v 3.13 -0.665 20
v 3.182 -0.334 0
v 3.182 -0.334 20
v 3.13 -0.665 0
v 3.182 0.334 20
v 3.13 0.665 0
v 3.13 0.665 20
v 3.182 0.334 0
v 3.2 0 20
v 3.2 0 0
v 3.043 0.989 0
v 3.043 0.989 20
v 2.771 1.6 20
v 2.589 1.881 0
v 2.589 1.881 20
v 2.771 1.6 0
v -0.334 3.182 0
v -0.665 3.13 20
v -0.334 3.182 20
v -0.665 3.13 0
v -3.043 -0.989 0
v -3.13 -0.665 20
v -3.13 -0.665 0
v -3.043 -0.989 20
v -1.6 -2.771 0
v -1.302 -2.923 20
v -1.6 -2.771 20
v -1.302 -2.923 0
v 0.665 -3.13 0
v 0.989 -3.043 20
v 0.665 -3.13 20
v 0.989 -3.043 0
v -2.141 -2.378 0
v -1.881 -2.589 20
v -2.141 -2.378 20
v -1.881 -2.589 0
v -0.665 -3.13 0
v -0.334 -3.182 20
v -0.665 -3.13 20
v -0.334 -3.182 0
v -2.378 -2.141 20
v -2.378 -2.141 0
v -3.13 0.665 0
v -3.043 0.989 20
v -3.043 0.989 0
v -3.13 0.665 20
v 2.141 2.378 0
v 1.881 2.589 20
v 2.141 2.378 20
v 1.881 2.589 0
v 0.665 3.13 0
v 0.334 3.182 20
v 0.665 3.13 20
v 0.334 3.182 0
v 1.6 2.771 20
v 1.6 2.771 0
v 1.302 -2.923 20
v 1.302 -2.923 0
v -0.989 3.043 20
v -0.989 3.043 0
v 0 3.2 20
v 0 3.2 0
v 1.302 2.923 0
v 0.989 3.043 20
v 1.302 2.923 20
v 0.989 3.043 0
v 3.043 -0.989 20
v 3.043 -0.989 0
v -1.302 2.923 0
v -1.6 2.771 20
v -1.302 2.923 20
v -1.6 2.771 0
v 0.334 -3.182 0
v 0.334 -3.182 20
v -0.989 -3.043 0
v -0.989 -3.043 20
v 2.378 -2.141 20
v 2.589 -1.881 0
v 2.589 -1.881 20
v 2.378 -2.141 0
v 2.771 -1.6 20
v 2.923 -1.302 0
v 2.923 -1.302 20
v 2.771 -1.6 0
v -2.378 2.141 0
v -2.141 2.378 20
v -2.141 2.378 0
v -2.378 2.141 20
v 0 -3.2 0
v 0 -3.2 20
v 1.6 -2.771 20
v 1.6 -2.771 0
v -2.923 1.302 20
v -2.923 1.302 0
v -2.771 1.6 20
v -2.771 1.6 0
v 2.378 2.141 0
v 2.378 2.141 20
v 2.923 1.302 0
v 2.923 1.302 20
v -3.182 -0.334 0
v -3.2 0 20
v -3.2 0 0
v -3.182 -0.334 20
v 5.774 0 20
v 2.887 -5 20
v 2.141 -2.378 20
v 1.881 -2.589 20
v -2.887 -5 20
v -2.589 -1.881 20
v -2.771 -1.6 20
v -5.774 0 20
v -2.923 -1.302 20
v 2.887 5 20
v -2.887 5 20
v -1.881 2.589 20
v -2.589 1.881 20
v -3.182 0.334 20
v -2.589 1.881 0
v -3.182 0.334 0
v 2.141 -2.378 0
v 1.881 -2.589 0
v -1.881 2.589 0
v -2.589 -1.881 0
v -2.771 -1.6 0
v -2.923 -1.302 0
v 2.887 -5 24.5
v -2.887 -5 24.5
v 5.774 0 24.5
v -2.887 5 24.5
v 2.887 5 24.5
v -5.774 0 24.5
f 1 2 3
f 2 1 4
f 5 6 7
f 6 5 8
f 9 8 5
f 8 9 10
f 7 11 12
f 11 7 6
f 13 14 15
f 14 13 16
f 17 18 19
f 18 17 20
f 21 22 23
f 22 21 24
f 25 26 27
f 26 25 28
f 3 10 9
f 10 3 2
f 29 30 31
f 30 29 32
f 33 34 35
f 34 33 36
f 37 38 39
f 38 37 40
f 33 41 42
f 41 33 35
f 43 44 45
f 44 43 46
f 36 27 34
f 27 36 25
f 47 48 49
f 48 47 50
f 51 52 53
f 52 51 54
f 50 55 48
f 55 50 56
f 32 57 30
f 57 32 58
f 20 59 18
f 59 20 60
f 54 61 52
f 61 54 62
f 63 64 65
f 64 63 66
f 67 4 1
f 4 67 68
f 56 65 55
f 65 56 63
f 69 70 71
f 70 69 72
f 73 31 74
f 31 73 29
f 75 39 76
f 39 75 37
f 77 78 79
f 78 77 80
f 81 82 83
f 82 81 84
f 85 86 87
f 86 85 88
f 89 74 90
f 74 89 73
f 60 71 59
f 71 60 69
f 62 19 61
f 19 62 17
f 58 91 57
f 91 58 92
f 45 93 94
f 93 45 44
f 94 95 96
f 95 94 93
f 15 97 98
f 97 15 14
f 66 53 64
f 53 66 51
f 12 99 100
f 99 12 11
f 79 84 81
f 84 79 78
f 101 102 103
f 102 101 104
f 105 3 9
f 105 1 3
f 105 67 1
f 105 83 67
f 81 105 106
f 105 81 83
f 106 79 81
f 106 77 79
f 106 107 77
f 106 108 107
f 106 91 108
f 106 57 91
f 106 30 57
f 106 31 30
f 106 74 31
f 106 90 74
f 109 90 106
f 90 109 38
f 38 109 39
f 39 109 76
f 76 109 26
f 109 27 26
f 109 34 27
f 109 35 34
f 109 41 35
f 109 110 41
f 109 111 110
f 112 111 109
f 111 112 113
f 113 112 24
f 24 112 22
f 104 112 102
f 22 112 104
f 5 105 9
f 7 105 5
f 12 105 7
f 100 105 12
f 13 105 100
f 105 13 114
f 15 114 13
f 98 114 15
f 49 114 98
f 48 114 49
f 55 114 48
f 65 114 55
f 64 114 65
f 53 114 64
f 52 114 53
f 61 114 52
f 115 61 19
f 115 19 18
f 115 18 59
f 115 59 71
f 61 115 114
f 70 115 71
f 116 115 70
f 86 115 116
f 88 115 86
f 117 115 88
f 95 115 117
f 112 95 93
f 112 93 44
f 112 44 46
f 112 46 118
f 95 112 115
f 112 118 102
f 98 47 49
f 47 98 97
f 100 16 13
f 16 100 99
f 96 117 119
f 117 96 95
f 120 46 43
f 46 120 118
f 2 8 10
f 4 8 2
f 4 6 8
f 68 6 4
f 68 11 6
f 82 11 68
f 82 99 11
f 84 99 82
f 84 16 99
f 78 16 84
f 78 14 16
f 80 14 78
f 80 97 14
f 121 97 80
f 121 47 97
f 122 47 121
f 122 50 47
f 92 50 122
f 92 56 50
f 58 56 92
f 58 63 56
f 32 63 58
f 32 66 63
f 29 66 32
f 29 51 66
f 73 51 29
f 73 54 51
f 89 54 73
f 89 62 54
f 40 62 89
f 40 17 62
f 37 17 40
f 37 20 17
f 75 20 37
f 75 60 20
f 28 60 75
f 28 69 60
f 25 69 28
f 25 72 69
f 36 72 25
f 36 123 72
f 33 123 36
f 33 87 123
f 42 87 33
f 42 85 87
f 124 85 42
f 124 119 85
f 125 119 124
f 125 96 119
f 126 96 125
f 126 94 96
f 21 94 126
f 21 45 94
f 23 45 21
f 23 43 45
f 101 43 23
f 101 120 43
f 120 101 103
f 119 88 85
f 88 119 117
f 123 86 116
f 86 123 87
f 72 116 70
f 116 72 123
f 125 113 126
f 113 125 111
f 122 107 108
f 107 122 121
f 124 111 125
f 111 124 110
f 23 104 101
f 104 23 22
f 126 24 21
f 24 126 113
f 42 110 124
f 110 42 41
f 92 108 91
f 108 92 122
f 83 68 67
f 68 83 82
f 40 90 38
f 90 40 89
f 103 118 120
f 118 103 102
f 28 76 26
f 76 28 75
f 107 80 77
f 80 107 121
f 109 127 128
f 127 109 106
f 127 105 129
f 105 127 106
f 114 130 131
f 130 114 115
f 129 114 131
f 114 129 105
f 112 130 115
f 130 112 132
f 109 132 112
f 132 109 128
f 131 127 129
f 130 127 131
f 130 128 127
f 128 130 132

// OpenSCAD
// Hex-head bolt.
$fn = 60;
eps = 0.02;
thread_d = 6.4;
flat = 10;
shaft_l = 20;
union() { cylinder(d=thread_d,h=shaft_l); translate([0,0,shaft_l]) cylinder(d=flat/cos(30),h=flat*0.45,$fn=6); }
